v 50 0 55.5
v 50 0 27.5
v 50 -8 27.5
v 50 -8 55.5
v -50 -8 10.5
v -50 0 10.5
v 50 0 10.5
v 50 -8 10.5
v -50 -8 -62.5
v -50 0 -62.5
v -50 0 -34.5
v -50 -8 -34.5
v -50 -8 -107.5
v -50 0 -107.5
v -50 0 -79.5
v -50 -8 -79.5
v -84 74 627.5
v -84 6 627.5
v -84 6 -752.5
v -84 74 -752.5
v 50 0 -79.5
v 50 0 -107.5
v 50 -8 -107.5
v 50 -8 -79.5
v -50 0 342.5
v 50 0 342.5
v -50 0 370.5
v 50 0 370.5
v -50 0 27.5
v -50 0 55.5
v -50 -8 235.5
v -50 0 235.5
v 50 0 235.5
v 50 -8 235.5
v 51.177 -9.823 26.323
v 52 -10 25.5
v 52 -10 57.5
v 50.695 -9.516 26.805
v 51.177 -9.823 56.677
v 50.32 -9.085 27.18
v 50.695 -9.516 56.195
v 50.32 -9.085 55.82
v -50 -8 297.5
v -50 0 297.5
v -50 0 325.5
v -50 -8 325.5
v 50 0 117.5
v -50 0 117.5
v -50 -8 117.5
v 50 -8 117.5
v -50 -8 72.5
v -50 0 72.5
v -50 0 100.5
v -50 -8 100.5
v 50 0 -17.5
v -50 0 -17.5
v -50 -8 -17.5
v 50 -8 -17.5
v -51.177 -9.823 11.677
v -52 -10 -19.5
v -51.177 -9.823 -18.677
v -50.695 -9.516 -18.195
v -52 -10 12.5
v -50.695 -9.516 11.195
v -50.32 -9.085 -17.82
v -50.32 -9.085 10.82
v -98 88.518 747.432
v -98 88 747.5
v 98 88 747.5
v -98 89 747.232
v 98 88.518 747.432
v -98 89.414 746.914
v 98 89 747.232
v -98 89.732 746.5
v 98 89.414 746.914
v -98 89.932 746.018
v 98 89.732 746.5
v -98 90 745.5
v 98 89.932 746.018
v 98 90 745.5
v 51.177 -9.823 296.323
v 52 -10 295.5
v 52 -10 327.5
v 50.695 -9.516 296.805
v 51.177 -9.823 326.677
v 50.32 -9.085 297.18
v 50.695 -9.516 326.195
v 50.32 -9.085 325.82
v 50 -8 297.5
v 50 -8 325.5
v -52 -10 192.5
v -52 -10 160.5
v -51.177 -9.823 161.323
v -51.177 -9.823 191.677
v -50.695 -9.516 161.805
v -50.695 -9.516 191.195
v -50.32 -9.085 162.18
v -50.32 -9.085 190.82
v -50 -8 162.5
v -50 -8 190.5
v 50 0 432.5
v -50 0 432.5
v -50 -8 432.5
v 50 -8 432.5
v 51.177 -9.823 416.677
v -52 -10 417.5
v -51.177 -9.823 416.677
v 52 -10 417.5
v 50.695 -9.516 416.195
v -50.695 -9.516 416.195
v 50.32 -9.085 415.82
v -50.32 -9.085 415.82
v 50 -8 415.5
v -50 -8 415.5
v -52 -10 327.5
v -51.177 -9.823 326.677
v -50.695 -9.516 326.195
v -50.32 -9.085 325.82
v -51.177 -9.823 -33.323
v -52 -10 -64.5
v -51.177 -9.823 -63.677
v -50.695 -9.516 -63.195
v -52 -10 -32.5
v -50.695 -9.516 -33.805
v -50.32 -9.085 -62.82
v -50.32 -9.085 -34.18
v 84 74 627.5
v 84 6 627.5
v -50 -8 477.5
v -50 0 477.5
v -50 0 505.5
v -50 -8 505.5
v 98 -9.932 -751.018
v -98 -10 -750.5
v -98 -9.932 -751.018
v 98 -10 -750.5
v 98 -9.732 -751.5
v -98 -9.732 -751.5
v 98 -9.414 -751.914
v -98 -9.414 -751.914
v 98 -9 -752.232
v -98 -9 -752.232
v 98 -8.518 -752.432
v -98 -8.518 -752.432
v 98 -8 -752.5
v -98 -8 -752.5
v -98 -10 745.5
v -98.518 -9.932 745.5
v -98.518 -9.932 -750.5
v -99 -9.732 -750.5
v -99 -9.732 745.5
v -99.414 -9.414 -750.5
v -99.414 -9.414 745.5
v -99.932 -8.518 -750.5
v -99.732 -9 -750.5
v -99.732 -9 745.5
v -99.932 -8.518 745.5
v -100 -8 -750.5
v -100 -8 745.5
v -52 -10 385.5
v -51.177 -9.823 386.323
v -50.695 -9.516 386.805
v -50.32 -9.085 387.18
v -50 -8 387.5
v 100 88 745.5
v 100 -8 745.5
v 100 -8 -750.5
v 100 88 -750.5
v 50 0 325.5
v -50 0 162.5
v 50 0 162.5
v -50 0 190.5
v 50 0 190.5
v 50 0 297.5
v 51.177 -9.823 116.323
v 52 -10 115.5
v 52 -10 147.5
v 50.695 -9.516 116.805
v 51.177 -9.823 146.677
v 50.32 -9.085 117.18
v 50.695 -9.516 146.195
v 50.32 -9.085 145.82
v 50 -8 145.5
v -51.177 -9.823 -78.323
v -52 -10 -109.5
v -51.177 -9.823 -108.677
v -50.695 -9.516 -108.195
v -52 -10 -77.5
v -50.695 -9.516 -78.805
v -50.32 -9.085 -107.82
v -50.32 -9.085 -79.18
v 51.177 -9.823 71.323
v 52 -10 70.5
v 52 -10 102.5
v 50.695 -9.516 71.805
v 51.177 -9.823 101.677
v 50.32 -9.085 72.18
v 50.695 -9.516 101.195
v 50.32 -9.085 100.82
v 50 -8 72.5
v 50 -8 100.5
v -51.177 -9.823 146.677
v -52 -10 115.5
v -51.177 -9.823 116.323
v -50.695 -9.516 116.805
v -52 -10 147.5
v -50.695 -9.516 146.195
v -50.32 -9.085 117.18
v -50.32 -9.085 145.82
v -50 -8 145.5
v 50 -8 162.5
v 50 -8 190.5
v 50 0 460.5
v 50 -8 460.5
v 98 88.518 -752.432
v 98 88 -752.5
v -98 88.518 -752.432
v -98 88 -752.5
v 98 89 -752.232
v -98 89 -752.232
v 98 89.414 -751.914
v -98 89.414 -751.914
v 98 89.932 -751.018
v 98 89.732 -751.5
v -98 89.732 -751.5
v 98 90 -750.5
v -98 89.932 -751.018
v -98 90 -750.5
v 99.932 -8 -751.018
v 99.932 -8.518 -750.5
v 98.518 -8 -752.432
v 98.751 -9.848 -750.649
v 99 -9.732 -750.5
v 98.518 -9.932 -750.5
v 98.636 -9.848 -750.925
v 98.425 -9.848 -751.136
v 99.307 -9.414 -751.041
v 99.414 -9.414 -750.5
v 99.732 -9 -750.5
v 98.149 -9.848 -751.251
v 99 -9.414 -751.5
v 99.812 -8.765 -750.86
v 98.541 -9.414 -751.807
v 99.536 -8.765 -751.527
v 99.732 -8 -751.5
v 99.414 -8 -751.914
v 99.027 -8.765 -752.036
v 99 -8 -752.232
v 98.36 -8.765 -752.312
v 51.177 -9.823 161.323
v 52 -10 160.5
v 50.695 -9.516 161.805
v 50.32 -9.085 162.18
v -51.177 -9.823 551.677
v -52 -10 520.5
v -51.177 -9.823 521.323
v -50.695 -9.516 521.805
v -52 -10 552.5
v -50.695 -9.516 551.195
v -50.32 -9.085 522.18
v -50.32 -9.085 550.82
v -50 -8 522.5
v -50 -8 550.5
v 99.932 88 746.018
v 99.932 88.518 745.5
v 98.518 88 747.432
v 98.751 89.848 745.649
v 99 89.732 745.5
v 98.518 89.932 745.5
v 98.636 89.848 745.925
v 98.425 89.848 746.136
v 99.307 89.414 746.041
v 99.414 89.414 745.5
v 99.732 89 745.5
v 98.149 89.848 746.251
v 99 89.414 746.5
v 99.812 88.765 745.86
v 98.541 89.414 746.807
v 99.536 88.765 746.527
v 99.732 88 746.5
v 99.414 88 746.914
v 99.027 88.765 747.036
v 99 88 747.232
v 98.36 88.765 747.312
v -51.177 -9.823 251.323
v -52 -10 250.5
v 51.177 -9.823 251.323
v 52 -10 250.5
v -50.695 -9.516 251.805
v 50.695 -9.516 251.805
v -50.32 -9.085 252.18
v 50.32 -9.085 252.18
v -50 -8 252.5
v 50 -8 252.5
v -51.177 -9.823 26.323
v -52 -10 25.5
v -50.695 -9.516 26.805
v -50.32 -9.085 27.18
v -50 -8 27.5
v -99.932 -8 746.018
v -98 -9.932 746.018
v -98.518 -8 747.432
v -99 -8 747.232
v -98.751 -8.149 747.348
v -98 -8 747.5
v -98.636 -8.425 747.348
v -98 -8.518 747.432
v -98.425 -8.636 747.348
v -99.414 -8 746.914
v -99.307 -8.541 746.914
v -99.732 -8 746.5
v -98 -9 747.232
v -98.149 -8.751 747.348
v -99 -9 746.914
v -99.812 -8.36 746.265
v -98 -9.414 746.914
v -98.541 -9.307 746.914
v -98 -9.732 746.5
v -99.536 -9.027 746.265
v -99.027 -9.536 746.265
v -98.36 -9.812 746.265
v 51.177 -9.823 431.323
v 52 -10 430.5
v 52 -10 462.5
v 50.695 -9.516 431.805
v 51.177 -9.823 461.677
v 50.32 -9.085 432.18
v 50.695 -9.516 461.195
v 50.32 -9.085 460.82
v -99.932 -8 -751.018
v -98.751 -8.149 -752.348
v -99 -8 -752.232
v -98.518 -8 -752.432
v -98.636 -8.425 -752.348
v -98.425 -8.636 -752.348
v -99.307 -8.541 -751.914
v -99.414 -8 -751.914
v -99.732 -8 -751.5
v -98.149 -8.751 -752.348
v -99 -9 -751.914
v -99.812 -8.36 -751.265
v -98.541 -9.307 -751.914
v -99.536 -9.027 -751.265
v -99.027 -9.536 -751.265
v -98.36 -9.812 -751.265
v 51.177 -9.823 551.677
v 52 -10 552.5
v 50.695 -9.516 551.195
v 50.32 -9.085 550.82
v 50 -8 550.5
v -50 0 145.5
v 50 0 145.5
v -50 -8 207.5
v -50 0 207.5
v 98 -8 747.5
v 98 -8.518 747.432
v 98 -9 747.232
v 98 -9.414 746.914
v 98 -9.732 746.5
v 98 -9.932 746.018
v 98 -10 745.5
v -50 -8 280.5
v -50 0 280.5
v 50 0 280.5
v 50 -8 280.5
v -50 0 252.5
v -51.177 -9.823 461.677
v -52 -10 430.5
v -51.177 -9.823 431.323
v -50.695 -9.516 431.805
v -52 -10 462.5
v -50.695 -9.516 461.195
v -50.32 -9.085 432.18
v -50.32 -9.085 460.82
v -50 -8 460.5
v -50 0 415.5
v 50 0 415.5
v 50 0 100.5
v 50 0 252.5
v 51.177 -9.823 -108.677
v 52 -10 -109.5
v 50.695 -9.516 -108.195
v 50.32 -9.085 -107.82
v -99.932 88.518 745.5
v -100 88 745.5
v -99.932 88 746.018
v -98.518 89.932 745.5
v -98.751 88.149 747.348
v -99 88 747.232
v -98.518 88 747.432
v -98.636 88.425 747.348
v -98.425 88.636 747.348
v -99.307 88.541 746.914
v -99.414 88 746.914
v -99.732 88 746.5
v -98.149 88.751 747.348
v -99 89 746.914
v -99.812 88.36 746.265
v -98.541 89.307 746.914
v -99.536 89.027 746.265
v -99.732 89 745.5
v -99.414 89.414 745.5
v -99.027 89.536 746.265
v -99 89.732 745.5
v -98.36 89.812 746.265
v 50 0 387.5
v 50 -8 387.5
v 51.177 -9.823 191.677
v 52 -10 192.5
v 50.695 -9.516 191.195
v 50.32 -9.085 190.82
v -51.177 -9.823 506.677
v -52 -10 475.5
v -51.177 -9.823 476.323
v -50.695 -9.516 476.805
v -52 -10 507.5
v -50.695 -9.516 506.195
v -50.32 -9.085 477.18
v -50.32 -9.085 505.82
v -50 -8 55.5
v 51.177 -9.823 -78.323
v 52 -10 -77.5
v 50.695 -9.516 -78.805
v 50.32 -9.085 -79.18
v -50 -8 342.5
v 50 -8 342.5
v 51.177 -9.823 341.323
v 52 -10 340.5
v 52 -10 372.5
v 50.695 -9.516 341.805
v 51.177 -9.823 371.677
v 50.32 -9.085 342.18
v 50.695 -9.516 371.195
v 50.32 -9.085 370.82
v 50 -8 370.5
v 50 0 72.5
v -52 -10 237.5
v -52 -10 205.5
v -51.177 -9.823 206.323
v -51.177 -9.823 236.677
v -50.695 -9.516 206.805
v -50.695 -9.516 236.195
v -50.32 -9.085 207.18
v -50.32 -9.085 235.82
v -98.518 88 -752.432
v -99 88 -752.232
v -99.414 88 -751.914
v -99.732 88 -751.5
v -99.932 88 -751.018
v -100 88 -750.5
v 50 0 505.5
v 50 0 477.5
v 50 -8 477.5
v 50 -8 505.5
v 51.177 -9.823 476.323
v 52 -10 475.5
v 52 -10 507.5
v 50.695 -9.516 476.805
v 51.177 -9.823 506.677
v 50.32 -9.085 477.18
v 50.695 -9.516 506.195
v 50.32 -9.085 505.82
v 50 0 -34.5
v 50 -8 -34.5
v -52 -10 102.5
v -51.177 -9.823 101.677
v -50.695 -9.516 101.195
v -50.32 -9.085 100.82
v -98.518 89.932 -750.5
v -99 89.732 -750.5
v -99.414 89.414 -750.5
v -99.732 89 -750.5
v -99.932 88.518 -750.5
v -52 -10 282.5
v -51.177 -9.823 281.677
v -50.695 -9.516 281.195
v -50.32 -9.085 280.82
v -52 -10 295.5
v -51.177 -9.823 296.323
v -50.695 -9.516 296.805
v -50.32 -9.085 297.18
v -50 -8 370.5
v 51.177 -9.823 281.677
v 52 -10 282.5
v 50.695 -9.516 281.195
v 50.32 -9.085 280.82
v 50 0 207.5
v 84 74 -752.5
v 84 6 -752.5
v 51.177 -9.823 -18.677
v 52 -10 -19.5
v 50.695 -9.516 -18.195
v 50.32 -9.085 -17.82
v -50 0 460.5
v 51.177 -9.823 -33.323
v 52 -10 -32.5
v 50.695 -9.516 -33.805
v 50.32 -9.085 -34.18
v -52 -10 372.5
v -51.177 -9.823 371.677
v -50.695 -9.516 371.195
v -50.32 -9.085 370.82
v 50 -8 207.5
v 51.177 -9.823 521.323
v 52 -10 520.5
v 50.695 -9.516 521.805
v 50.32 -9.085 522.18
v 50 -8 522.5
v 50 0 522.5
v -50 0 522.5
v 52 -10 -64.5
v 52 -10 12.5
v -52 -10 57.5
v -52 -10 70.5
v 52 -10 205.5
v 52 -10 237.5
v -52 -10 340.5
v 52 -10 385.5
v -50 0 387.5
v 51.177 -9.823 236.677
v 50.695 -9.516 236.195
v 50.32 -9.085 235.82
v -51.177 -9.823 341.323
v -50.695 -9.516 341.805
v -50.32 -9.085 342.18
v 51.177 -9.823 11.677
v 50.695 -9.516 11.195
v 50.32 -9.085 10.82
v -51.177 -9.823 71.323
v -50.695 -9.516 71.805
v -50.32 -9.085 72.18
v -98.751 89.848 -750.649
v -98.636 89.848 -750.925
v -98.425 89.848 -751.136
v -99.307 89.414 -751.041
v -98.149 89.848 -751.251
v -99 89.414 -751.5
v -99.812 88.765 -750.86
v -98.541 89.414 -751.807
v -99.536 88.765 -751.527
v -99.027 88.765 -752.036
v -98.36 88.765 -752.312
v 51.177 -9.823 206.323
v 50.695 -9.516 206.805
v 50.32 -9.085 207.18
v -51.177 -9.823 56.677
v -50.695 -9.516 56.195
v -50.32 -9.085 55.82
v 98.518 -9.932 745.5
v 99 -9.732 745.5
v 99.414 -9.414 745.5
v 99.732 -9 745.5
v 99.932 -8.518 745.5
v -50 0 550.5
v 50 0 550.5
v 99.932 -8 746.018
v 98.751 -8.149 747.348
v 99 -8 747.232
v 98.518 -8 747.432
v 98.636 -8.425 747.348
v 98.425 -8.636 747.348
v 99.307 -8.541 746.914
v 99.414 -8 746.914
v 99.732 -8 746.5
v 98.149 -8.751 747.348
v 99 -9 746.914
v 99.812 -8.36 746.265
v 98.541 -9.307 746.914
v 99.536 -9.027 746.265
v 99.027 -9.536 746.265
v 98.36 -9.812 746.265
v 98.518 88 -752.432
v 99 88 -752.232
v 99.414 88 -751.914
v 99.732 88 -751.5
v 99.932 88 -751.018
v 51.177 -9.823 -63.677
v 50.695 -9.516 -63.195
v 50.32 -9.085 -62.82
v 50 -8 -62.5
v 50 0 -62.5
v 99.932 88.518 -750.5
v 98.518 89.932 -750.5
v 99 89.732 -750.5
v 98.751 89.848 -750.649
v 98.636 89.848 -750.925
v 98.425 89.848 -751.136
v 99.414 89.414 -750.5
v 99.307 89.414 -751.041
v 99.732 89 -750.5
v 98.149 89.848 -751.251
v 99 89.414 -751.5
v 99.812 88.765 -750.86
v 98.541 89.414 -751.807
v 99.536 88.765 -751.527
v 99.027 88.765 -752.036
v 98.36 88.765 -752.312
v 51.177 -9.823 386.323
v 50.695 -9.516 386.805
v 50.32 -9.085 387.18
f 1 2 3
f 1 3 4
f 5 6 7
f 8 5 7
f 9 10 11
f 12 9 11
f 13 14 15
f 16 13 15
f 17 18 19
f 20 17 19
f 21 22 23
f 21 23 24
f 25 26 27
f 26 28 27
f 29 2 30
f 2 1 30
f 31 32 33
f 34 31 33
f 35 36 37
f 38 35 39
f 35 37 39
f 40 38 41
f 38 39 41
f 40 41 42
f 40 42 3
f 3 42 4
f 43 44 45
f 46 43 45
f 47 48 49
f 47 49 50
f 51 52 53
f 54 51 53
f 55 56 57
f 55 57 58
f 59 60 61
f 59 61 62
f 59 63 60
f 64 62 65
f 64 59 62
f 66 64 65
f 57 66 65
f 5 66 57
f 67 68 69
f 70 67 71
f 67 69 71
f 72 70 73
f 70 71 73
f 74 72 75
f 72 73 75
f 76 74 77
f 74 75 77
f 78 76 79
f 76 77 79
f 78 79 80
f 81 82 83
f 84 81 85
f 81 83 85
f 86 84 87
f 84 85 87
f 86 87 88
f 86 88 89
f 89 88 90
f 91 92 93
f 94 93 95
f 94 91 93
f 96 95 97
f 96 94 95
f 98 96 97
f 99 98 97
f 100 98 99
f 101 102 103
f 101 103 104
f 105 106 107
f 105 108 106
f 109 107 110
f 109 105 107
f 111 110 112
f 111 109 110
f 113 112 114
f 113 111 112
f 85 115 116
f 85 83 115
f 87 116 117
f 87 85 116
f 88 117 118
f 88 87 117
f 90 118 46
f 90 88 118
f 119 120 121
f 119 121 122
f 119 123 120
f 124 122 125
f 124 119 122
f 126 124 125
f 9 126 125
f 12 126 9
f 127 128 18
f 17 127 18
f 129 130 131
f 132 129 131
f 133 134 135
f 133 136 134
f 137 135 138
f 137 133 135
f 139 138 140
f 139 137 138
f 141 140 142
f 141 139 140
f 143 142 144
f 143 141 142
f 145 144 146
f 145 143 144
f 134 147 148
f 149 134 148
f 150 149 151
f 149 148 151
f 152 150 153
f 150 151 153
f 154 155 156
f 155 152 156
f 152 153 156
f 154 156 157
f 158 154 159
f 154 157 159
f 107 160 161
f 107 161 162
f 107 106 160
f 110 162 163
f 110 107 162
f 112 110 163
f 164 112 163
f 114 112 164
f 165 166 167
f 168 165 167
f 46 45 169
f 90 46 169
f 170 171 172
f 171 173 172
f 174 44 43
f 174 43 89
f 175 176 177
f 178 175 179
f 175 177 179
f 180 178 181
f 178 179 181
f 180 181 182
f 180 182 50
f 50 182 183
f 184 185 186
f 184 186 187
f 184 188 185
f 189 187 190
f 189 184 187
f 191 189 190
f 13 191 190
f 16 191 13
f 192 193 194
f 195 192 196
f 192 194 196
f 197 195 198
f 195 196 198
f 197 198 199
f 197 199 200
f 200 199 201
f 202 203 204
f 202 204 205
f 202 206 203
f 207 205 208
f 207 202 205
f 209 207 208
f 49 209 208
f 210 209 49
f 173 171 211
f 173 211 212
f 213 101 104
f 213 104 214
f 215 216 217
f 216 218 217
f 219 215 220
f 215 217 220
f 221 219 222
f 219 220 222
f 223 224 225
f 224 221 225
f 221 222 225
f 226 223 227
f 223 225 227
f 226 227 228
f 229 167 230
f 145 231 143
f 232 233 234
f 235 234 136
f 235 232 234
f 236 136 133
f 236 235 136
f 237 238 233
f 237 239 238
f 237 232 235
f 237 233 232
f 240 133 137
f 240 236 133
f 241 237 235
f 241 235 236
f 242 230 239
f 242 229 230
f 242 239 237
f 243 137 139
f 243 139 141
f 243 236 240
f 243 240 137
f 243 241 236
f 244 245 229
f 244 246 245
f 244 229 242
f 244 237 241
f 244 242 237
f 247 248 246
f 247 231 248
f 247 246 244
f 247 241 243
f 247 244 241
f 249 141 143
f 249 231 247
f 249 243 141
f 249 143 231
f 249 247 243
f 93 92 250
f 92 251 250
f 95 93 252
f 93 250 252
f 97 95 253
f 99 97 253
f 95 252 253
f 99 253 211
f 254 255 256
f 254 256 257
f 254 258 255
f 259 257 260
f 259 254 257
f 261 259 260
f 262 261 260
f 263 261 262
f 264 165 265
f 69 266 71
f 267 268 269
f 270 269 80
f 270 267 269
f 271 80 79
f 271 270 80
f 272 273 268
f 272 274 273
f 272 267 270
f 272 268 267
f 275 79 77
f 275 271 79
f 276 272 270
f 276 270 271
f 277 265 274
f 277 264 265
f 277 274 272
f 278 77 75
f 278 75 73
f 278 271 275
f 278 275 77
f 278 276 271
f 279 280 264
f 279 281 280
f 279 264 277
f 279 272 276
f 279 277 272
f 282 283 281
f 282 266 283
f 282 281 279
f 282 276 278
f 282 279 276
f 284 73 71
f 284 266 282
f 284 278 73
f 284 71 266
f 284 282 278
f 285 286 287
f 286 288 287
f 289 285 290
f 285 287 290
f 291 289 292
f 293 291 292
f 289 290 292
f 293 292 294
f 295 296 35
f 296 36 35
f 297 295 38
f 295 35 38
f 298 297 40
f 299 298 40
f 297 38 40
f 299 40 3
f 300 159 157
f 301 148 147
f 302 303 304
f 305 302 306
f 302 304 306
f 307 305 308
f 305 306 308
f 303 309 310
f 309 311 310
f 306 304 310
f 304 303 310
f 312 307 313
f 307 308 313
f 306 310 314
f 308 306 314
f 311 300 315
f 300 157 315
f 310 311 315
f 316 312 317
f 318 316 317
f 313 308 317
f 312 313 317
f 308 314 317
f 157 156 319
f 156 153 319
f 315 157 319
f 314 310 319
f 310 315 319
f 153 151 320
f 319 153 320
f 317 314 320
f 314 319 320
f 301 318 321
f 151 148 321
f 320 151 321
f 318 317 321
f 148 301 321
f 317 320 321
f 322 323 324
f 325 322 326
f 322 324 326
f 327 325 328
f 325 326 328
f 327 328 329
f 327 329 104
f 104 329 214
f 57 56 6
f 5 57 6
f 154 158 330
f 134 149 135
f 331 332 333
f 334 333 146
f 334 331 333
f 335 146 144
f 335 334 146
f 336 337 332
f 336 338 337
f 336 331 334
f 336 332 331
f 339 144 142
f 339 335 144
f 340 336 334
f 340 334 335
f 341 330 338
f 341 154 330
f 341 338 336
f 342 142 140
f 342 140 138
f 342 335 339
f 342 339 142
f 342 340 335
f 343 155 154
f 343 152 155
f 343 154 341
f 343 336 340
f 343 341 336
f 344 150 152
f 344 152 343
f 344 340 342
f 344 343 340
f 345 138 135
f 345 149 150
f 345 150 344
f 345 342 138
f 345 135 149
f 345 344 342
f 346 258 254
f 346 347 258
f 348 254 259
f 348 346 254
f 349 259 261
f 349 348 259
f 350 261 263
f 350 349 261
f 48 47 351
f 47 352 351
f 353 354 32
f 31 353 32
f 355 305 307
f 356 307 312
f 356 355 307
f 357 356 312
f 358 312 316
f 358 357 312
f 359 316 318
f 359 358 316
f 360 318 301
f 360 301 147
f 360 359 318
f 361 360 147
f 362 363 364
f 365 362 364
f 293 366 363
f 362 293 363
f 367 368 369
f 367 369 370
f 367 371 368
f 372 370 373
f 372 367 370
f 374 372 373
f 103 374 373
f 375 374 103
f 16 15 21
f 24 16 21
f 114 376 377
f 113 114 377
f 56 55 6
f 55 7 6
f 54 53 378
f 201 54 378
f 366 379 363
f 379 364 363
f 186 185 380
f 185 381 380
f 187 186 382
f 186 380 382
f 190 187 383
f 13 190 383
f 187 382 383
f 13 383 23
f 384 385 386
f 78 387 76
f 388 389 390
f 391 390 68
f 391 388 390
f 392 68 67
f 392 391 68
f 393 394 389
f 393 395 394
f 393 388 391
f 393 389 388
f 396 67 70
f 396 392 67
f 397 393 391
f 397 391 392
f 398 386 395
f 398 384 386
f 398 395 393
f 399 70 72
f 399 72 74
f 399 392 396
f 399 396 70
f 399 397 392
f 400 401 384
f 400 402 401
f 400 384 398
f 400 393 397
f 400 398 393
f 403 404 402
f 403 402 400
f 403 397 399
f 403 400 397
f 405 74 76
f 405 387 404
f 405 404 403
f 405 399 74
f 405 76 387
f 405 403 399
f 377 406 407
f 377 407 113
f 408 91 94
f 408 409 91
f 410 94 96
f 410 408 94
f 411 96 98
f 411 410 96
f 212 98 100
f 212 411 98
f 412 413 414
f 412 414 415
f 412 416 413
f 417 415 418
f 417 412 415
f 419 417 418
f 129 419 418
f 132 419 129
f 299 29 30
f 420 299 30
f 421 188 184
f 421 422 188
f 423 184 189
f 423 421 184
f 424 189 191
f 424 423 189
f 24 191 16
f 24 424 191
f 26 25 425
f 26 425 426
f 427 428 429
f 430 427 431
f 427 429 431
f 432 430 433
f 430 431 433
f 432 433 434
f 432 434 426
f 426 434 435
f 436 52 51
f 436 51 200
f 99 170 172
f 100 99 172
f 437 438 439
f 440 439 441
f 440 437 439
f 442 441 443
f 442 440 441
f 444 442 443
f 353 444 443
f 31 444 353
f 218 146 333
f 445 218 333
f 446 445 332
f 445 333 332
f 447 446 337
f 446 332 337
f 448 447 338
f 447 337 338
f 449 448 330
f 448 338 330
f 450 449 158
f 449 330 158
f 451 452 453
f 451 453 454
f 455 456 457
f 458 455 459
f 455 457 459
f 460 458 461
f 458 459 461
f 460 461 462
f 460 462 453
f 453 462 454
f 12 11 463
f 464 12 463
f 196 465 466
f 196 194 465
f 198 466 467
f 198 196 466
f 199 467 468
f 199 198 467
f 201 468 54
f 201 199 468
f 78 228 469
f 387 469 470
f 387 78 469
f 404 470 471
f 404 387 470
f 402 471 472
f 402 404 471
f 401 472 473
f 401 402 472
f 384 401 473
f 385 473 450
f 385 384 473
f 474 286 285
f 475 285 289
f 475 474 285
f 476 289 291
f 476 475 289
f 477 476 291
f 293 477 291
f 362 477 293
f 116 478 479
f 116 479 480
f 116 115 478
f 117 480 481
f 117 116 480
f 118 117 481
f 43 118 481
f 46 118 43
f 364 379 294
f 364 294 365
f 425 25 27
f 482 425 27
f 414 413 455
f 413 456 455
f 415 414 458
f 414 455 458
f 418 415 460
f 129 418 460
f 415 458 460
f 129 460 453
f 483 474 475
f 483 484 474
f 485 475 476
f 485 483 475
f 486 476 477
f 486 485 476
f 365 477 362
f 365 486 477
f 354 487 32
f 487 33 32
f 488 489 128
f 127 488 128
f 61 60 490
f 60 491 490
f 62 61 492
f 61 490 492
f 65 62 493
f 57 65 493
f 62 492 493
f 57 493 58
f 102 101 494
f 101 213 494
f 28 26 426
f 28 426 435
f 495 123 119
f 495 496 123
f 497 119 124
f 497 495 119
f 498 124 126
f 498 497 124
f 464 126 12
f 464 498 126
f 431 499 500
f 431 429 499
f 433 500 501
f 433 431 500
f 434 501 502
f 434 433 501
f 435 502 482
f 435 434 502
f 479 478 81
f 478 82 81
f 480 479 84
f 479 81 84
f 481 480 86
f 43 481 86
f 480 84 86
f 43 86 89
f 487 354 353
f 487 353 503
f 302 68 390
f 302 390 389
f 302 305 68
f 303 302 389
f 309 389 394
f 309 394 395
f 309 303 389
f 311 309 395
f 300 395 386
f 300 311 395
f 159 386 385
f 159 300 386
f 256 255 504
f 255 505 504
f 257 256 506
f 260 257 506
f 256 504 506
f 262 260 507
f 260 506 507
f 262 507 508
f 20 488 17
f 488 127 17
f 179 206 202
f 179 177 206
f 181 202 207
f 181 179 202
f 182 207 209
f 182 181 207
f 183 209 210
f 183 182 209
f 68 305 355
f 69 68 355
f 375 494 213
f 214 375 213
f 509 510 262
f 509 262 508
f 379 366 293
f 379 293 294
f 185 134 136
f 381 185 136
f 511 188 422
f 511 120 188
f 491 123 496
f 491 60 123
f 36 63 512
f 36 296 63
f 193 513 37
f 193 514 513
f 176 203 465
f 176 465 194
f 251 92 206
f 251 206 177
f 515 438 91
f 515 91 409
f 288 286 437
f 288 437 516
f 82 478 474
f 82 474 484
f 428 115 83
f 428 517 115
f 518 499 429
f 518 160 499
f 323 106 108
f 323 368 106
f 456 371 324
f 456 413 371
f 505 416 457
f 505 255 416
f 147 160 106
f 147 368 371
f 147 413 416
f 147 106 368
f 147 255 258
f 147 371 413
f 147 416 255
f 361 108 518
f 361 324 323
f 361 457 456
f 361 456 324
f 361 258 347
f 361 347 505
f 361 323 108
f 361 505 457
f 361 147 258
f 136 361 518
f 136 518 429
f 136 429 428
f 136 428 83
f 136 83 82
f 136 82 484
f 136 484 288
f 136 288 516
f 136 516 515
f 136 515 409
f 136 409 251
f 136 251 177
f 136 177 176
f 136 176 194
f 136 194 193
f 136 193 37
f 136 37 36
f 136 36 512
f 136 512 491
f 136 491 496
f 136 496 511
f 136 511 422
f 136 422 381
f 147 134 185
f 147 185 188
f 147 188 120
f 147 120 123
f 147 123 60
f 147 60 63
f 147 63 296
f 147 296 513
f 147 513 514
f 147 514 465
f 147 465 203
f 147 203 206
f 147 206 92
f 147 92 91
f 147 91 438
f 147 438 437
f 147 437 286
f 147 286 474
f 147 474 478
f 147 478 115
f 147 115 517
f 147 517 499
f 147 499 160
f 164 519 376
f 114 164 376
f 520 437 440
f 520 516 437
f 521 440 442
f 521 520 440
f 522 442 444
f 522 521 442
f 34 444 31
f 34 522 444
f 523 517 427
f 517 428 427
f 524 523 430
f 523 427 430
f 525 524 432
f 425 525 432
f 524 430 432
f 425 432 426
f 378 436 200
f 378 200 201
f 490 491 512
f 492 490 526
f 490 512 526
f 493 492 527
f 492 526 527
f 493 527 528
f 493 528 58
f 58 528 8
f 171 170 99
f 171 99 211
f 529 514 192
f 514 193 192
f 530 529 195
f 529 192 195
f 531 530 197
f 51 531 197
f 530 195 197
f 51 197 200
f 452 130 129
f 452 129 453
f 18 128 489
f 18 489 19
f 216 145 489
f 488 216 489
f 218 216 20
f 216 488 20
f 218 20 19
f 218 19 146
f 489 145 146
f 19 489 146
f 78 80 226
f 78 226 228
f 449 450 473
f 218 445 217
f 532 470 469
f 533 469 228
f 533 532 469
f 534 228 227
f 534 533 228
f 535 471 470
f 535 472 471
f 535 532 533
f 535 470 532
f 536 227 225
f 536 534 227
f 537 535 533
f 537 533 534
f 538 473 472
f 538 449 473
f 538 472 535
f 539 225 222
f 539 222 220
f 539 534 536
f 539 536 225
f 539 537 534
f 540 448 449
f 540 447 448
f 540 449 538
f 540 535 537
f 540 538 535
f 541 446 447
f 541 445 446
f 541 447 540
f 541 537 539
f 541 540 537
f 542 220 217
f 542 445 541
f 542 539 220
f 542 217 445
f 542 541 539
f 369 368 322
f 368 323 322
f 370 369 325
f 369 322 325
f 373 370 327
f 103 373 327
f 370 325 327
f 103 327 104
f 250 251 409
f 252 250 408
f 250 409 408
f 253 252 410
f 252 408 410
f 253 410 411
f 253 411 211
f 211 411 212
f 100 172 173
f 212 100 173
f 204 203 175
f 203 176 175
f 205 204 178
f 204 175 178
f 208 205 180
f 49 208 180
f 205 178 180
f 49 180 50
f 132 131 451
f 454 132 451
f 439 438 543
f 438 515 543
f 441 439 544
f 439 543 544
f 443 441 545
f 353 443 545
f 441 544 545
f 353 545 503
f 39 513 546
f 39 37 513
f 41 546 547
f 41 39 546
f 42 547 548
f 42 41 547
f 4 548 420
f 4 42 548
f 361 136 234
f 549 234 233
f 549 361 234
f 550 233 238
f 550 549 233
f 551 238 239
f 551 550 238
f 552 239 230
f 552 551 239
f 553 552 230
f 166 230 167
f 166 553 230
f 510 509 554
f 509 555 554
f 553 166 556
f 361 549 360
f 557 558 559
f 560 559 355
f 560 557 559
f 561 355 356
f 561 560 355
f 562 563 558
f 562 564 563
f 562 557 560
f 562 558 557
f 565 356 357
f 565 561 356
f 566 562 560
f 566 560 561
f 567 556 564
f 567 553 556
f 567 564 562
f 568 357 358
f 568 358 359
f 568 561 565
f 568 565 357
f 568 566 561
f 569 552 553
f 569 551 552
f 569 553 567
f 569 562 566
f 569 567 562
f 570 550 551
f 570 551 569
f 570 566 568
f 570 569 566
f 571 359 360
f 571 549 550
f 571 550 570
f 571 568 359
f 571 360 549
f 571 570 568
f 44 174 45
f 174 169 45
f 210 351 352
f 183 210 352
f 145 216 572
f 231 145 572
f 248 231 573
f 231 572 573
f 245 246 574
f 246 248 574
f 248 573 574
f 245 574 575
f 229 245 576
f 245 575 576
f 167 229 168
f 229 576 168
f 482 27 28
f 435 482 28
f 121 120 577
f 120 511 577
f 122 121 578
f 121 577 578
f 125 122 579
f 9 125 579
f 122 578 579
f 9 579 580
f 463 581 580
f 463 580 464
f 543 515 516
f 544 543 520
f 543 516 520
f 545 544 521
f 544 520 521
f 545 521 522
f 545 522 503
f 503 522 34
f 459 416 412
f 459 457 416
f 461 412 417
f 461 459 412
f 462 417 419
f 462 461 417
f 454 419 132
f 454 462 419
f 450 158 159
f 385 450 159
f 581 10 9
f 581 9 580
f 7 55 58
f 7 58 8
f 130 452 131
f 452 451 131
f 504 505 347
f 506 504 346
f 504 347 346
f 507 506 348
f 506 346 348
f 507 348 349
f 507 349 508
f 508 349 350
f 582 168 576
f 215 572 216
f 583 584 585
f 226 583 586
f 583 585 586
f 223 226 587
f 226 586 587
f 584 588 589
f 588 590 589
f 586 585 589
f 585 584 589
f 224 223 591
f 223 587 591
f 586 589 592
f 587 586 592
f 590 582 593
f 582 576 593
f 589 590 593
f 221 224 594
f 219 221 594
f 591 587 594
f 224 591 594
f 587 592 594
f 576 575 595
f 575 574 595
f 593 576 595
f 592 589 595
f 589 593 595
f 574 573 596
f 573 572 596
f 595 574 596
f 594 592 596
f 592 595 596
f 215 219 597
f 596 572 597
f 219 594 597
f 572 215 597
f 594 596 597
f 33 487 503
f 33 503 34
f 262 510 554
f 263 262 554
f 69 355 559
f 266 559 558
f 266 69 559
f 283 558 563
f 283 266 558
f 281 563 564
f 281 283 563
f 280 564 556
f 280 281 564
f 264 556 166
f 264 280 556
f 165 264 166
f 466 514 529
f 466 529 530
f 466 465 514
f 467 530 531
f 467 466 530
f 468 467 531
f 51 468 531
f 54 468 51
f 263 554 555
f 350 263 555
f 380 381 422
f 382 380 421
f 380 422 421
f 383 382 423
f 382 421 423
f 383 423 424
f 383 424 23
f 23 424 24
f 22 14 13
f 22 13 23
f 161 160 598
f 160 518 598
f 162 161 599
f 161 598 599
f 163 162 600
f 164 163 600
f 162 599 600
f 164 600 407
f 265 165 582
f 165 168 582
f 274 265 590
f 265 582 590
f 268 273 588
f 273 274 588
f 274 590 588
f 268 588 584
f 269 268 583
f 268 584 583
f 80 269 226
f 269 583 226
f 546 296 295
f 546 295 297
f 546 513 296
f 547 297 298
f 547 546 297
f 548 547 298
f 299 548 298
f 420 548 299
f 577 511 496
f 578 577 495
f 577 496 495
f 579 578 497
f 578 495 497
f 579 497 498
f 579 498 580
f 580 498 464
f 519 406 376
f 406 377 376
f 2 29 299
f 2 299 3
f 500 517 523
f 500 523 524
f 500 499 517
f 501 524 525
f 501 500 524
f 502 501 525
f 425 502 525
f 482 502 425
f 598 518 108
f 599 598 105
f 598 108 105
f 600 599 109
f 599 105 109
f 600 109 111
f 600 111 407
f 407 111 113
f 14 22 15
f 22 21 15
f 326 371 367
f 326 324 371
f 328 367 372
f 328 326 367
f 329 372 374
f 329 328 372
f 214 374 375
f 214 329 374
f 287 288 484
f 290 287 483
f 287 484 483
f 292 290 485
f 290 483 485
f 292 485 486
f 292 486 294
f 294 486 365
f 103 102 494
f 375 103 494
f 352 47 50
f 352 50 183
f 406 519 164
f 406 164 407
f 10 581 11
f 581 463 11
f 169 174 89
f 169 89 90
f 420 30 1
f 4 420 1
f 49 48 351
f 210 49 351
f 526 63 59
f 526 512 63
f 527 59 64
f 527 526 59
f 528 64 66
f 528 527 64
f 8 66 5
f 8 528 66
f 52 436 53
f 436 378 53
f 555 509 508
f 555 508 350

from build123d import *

# Parameters (mm, degrees)
F0_W     = 200
F0_H     = 1500
F0_W_2   = 100
F0_H_2   = 28
F1_DEPTH = 10
F2_W     = 200
F2_H     = 1500
F2_W_2   = 100
F2_H_2   = 28
F3_DEPTH = 6
F5_DEPTH = 68
F6_W     = 168
F6_H     = 1380
F7_DEPTH = 16
F8_R     = 2


# Not quite as in the source:
# - a feature names something its author has since deleted; it is built from what else it names


with BuildPart() as f1:
    # F0 (on Front) → F1 (new body)
    with BuildSketch(Plane.XZ):
        with Locations((0, -2.5)):
            Rectangle(F0_W, F0_H)
        with Locations((0, -93.5)):
            Rectangle(F0_W_2, F0_H_2, mode=Mode.SUBTRACT)
        with Locations((0, -48.5)):
            Rectangle(F0_W_2, F0_H_2, mode=Mode.SUBTRACT)
        with Locations((0, -3.5)):
            Rectangle(F0_W_2, F0_H_2, mode=Mode.SUBTRACT)
        with Locations((0, 41.5)):
            Rectangle(F0_W_2, F0_H_2, mode=Mode.SUBTRACT)
        with Locations((0, 86.5)):
            Rectangle(F0_W_2, F0_H_2, mode=Mode.SUBTRACT)
        with Locations((0, 131.5)):
            Rectangle(F0_W_2, F0_H_2, mode=Mode.SUBTRACT)
        with Locations((0, 176.5)):
            Rectangle(F0_W_2, F0_H_2, mode=Mode.SUBTRACT)
        with Locations((0, 221.5)):
            Rectangle(F0_W_2, F0_H_2, mode=Mode.SUBTRACT)
        with Locations((0, 266.5)):
            Rectangle(F0_W_2, F0_H_2, mode=Mode.SUBTRACT)
        with Locations((0, 311.5)):
            Rectangle(F0_W_2, F0_H_2, mode=Mode.SUBTRACT)
        with Locations((0, 356.5)):
            Rectangle(F0_W_2, F0_H_2, mode=Mode.SUBTRACT)
        with Locations((0, 401.5)):
            Rectangle(F0_W_2, F0_H_2, mode=Mode.SUBTRACT)
        with Locations((0, 446.5)):
            Rectangle(F0_W_2, F0_H_2, mode=Mode.SUBTRACT)
        with Locations((0, 491.5)):
            Rectangle(F0_W_2, F0_H_2, mode=Mode.SUBTRACT)
        with Locations((0, 536.5)):
            Rectangle(F0_W_2, F0_H_2, mode=Mode.SUBTRACT)
    extrude(amount=F1_DEPTH)

    # F2 (on face) → F3 (join)
    with BuildSketch(Plane(origin=(0, 0, 0), x_dir=(-1, 0, 0), z_dir=(0, 1, 0))):
        with Locations((0, -2.5)):
            Rectangle(F2_W, F2_H)
        with Locations((0, -93.5)):
            Rectangle(F2_W_2, F2_H_2, mode=Mode.SUBTRACT)
        with Locations((0, -48.5)):
            Rectangle(F2_W_2, F2_H_2, mode=Mode.SUBTRACT)
        with Locations((0, -3.5)):
            Rectangle(F2_W_2, F2_H_2, mode=Mode.SUBTRACT)
        with Locations((0, 41.5)):
            Rectangle(F2_W_2, F2_H_2, mode=Mode.SUBTRACT)
        with Locations((0, 86.5)):
            Rectangle(F2_W_2, F2_H_2, mode=Mode.SUBTRACT)
        with Locations((0, 131.5)):
            Rectangle(F2_W_2, F2_H_2, mode=Mode.SUBTRACT)
        with Locations((0, 176.5)):
            Rectangle(F2_W_2, F2_H_2, mode=Mode.SUBTRACT)
        with Locations((0, 221.5)):
            Rectangle(F2_W_2, F2_H_2, mode=Mode.SUBTRACT)
        with Locations((0, 266.5)):
            Rectangle(F2_W_2, F2_H_2, mode=Mode.SUBTRACT)
        with Locations((0, 311.5)):
            Rectangle(F2_W_2, F2_H_2, mode=Mode.SUBTRACT)
        with Locations((0, 356.5)):
            Rectangle(F2_W_2, F2_H_2, mode=Mode.SUBTRACT)
        with Locations((0, 401.5)):
            Rectangle(F2_W_2, F2_H_2, mode=Mode.SUBTRACT)
        with Locations((0, 446.5)):
            Rectangle(F2_W_2, F2_H_2, mode=Mode.SUBTRACT)
        with Locations((0, 491.5)):
            Rectangle(F2_W_2, F2_H_2, mode=Mode.SUBTRACT)
        with Locations((0, 536.5)):
            Rectangle(F2_W_2, F2_H_2, mode=Mode.SUBTRACT)
        with Locations((0, -93.5)):
            Rectangle(F2_W_2, F2_H_2)
        with Locations((0, -48.5)):
            Rectangle(F2_W_2, F2_H_2)
        with Locations((0, -3.5)):
            Rectangle(F2_W_2, F2_H_2)
        with Locations((0, 41.5)):
            Rectangle(F2_W_2, F2_H_2)
        with Locations((0, 86.5)):
            Rectangle(F2_W_2, F2_H_2)
        with Locations((0, 131.5)):
            Rectangle(F2_W_2, F2_H_2)
        with Locations((0, 176.5)):
            Rectangle(F2_W_2, F2_H_2)
        with Locations((0, 221.5)):
            Rectangle(F2_W_2, F2_H_2)
        with Locations((0, 266.5)):
            Rectangle(F2_W_2, F2_H_2)
        with Locations((0, 311.5)):
            Rectangle(F2_W_2, F2_H_2)
        with Locations((0, 356.5)):
            Rectangle(F2_W_2, F2_H_2)
        with Locations((0, 401.5)):
            Rectangle(F2_W_2, F2_H_2)
        with Locations((0, 446.5)):
            Rectangle(F2_W_2, F2_H_2)
        with Locations((0, 491.5)):
            Rectangle(F2_W_2, F2_H_2)
        with Locations((0, 536.5)):
            Rectangle(F2_W_2, F2_H_2)
    extrude(amount=F3_DEPTH)

    # F4 (on face) → F5 (join)
    with BuildSketch(Plane(origin=(0, 6, 0), x_dir=(-1, 0, 0), z_dir=(0, 1, 0))):
        Polygon((100, 747.5), (-100, 747.5), (-100, 627.5), (-100, -752.5), (-84, -752.5), (-84, -732.5), (-84, 627.5), (84, 627.5), (84, -732.5), (84, -752.5), (100, -752.5), (100, 727.5), align=None)
    extrude(amount=F5_DEPTH)

    # F6 (on face) → F7 (join)
    with BuildSketch(Plane(origin=(0, 74, 0), x_dir=(-1, 0, 0), z_dir=(0, 1, 0))):
        Polygon((100, 747.5), (-100, 747.5), (-100, -752.5), (-84, -752.5), (-84, 627.5), (84, 627.5), (84, -752.5), (100, -752.5), align=None)
        with Locations((0, -62.5)):
            Rectangle(F6_W, F6_H)
    extrude(amount=F7_DEPTH)

    # F8
    f8_edges = [f1.edges().sort_by_distance(p)[0] for p in [
        (100, 40, -752.5),
        (100, -10, -2.5),
        (100, 40, 747.5),
        (100, 90, -2.5),
        (-100, -10, -2.5),
        (-100, 40, -752.5),
        (-100, 90, -2.5),
        (-100, 40, 747.5),
        (0, -10, 747.5),
        (0, -10, -752.5),
        (0, -10, -107.5),
        (-50, -10, -93.5),
        (0, -10, -79.5),
        (50, -10, -93.5),
        (0, -10, -62.5),
        (-50, -10, -48.5),
        (0, -10, -34.5),
        (50, -10, -48.5),
        (0, -10, -17.5),
        (-50, -10, -3.5),
        (0, -10, 10.5),
        (50, -10, -3.5),
        (0, -10, 27.5),
        (-50, -10, 41.5),
        (0, -10, 55.5),
        (50, -10, 41.5),
        (0, -10, 72.5),
        (-50, -10, 86.5),
        (0, -10, 100.5),
        (50, -10, 86.5),
        (0, -10, 117.5),
        (-50, -10, 131.5),
        (0, -10, 145.5),
        (50, -10, 131.5),
        (0, -10, 162.5),
        (-50, -10, 176.5),
        (0, -10, 190.5),
        (50, -10, 176.5),
        (0, -10, 207.5),
        (-50, -10, 221.5),
        (0, -10, 235.5),
        (50, -10, 221.5),
        (0, -10, 252.5),
        (-50, -10, 266.5),
        (0, -10, 280.5),
        (50, -10, 266.5),
        (0, -10, 297.5),
        (-50, -10, 311.5),
        (0, -10, 325.5),
        (50, -10, 311.5),
        (0, -10, 342.5),
        (-50, -10, 356.5),
        (0, -10, 370.5),
        (50, -10, 356.5),
        (0, -10, 387.5),
        (-50, -10, 401.5),
        (0, -10, 415.5),
        (50, -10, 401.5),
        (0, -10, 432.5),
        (-50, -10, 446.5),
        (0, -10, 460.5),
        (50, -10, 446.5),
        (0, -10, 477.5),
        (-50, -10, 491.5),
        (0, -10, 505.5),
        (50, -10, 491.5),
        (0, -10, 522.5),
        (-50, -10, 536.5),
        (0, -10, 550.5),
        (50, -10, 536.5),
        (0, 90, 747.5),
        (0, 90, -752.5),
    ]]
    fillet(f8_edges, radius=F8_R)


solid = f1.part
